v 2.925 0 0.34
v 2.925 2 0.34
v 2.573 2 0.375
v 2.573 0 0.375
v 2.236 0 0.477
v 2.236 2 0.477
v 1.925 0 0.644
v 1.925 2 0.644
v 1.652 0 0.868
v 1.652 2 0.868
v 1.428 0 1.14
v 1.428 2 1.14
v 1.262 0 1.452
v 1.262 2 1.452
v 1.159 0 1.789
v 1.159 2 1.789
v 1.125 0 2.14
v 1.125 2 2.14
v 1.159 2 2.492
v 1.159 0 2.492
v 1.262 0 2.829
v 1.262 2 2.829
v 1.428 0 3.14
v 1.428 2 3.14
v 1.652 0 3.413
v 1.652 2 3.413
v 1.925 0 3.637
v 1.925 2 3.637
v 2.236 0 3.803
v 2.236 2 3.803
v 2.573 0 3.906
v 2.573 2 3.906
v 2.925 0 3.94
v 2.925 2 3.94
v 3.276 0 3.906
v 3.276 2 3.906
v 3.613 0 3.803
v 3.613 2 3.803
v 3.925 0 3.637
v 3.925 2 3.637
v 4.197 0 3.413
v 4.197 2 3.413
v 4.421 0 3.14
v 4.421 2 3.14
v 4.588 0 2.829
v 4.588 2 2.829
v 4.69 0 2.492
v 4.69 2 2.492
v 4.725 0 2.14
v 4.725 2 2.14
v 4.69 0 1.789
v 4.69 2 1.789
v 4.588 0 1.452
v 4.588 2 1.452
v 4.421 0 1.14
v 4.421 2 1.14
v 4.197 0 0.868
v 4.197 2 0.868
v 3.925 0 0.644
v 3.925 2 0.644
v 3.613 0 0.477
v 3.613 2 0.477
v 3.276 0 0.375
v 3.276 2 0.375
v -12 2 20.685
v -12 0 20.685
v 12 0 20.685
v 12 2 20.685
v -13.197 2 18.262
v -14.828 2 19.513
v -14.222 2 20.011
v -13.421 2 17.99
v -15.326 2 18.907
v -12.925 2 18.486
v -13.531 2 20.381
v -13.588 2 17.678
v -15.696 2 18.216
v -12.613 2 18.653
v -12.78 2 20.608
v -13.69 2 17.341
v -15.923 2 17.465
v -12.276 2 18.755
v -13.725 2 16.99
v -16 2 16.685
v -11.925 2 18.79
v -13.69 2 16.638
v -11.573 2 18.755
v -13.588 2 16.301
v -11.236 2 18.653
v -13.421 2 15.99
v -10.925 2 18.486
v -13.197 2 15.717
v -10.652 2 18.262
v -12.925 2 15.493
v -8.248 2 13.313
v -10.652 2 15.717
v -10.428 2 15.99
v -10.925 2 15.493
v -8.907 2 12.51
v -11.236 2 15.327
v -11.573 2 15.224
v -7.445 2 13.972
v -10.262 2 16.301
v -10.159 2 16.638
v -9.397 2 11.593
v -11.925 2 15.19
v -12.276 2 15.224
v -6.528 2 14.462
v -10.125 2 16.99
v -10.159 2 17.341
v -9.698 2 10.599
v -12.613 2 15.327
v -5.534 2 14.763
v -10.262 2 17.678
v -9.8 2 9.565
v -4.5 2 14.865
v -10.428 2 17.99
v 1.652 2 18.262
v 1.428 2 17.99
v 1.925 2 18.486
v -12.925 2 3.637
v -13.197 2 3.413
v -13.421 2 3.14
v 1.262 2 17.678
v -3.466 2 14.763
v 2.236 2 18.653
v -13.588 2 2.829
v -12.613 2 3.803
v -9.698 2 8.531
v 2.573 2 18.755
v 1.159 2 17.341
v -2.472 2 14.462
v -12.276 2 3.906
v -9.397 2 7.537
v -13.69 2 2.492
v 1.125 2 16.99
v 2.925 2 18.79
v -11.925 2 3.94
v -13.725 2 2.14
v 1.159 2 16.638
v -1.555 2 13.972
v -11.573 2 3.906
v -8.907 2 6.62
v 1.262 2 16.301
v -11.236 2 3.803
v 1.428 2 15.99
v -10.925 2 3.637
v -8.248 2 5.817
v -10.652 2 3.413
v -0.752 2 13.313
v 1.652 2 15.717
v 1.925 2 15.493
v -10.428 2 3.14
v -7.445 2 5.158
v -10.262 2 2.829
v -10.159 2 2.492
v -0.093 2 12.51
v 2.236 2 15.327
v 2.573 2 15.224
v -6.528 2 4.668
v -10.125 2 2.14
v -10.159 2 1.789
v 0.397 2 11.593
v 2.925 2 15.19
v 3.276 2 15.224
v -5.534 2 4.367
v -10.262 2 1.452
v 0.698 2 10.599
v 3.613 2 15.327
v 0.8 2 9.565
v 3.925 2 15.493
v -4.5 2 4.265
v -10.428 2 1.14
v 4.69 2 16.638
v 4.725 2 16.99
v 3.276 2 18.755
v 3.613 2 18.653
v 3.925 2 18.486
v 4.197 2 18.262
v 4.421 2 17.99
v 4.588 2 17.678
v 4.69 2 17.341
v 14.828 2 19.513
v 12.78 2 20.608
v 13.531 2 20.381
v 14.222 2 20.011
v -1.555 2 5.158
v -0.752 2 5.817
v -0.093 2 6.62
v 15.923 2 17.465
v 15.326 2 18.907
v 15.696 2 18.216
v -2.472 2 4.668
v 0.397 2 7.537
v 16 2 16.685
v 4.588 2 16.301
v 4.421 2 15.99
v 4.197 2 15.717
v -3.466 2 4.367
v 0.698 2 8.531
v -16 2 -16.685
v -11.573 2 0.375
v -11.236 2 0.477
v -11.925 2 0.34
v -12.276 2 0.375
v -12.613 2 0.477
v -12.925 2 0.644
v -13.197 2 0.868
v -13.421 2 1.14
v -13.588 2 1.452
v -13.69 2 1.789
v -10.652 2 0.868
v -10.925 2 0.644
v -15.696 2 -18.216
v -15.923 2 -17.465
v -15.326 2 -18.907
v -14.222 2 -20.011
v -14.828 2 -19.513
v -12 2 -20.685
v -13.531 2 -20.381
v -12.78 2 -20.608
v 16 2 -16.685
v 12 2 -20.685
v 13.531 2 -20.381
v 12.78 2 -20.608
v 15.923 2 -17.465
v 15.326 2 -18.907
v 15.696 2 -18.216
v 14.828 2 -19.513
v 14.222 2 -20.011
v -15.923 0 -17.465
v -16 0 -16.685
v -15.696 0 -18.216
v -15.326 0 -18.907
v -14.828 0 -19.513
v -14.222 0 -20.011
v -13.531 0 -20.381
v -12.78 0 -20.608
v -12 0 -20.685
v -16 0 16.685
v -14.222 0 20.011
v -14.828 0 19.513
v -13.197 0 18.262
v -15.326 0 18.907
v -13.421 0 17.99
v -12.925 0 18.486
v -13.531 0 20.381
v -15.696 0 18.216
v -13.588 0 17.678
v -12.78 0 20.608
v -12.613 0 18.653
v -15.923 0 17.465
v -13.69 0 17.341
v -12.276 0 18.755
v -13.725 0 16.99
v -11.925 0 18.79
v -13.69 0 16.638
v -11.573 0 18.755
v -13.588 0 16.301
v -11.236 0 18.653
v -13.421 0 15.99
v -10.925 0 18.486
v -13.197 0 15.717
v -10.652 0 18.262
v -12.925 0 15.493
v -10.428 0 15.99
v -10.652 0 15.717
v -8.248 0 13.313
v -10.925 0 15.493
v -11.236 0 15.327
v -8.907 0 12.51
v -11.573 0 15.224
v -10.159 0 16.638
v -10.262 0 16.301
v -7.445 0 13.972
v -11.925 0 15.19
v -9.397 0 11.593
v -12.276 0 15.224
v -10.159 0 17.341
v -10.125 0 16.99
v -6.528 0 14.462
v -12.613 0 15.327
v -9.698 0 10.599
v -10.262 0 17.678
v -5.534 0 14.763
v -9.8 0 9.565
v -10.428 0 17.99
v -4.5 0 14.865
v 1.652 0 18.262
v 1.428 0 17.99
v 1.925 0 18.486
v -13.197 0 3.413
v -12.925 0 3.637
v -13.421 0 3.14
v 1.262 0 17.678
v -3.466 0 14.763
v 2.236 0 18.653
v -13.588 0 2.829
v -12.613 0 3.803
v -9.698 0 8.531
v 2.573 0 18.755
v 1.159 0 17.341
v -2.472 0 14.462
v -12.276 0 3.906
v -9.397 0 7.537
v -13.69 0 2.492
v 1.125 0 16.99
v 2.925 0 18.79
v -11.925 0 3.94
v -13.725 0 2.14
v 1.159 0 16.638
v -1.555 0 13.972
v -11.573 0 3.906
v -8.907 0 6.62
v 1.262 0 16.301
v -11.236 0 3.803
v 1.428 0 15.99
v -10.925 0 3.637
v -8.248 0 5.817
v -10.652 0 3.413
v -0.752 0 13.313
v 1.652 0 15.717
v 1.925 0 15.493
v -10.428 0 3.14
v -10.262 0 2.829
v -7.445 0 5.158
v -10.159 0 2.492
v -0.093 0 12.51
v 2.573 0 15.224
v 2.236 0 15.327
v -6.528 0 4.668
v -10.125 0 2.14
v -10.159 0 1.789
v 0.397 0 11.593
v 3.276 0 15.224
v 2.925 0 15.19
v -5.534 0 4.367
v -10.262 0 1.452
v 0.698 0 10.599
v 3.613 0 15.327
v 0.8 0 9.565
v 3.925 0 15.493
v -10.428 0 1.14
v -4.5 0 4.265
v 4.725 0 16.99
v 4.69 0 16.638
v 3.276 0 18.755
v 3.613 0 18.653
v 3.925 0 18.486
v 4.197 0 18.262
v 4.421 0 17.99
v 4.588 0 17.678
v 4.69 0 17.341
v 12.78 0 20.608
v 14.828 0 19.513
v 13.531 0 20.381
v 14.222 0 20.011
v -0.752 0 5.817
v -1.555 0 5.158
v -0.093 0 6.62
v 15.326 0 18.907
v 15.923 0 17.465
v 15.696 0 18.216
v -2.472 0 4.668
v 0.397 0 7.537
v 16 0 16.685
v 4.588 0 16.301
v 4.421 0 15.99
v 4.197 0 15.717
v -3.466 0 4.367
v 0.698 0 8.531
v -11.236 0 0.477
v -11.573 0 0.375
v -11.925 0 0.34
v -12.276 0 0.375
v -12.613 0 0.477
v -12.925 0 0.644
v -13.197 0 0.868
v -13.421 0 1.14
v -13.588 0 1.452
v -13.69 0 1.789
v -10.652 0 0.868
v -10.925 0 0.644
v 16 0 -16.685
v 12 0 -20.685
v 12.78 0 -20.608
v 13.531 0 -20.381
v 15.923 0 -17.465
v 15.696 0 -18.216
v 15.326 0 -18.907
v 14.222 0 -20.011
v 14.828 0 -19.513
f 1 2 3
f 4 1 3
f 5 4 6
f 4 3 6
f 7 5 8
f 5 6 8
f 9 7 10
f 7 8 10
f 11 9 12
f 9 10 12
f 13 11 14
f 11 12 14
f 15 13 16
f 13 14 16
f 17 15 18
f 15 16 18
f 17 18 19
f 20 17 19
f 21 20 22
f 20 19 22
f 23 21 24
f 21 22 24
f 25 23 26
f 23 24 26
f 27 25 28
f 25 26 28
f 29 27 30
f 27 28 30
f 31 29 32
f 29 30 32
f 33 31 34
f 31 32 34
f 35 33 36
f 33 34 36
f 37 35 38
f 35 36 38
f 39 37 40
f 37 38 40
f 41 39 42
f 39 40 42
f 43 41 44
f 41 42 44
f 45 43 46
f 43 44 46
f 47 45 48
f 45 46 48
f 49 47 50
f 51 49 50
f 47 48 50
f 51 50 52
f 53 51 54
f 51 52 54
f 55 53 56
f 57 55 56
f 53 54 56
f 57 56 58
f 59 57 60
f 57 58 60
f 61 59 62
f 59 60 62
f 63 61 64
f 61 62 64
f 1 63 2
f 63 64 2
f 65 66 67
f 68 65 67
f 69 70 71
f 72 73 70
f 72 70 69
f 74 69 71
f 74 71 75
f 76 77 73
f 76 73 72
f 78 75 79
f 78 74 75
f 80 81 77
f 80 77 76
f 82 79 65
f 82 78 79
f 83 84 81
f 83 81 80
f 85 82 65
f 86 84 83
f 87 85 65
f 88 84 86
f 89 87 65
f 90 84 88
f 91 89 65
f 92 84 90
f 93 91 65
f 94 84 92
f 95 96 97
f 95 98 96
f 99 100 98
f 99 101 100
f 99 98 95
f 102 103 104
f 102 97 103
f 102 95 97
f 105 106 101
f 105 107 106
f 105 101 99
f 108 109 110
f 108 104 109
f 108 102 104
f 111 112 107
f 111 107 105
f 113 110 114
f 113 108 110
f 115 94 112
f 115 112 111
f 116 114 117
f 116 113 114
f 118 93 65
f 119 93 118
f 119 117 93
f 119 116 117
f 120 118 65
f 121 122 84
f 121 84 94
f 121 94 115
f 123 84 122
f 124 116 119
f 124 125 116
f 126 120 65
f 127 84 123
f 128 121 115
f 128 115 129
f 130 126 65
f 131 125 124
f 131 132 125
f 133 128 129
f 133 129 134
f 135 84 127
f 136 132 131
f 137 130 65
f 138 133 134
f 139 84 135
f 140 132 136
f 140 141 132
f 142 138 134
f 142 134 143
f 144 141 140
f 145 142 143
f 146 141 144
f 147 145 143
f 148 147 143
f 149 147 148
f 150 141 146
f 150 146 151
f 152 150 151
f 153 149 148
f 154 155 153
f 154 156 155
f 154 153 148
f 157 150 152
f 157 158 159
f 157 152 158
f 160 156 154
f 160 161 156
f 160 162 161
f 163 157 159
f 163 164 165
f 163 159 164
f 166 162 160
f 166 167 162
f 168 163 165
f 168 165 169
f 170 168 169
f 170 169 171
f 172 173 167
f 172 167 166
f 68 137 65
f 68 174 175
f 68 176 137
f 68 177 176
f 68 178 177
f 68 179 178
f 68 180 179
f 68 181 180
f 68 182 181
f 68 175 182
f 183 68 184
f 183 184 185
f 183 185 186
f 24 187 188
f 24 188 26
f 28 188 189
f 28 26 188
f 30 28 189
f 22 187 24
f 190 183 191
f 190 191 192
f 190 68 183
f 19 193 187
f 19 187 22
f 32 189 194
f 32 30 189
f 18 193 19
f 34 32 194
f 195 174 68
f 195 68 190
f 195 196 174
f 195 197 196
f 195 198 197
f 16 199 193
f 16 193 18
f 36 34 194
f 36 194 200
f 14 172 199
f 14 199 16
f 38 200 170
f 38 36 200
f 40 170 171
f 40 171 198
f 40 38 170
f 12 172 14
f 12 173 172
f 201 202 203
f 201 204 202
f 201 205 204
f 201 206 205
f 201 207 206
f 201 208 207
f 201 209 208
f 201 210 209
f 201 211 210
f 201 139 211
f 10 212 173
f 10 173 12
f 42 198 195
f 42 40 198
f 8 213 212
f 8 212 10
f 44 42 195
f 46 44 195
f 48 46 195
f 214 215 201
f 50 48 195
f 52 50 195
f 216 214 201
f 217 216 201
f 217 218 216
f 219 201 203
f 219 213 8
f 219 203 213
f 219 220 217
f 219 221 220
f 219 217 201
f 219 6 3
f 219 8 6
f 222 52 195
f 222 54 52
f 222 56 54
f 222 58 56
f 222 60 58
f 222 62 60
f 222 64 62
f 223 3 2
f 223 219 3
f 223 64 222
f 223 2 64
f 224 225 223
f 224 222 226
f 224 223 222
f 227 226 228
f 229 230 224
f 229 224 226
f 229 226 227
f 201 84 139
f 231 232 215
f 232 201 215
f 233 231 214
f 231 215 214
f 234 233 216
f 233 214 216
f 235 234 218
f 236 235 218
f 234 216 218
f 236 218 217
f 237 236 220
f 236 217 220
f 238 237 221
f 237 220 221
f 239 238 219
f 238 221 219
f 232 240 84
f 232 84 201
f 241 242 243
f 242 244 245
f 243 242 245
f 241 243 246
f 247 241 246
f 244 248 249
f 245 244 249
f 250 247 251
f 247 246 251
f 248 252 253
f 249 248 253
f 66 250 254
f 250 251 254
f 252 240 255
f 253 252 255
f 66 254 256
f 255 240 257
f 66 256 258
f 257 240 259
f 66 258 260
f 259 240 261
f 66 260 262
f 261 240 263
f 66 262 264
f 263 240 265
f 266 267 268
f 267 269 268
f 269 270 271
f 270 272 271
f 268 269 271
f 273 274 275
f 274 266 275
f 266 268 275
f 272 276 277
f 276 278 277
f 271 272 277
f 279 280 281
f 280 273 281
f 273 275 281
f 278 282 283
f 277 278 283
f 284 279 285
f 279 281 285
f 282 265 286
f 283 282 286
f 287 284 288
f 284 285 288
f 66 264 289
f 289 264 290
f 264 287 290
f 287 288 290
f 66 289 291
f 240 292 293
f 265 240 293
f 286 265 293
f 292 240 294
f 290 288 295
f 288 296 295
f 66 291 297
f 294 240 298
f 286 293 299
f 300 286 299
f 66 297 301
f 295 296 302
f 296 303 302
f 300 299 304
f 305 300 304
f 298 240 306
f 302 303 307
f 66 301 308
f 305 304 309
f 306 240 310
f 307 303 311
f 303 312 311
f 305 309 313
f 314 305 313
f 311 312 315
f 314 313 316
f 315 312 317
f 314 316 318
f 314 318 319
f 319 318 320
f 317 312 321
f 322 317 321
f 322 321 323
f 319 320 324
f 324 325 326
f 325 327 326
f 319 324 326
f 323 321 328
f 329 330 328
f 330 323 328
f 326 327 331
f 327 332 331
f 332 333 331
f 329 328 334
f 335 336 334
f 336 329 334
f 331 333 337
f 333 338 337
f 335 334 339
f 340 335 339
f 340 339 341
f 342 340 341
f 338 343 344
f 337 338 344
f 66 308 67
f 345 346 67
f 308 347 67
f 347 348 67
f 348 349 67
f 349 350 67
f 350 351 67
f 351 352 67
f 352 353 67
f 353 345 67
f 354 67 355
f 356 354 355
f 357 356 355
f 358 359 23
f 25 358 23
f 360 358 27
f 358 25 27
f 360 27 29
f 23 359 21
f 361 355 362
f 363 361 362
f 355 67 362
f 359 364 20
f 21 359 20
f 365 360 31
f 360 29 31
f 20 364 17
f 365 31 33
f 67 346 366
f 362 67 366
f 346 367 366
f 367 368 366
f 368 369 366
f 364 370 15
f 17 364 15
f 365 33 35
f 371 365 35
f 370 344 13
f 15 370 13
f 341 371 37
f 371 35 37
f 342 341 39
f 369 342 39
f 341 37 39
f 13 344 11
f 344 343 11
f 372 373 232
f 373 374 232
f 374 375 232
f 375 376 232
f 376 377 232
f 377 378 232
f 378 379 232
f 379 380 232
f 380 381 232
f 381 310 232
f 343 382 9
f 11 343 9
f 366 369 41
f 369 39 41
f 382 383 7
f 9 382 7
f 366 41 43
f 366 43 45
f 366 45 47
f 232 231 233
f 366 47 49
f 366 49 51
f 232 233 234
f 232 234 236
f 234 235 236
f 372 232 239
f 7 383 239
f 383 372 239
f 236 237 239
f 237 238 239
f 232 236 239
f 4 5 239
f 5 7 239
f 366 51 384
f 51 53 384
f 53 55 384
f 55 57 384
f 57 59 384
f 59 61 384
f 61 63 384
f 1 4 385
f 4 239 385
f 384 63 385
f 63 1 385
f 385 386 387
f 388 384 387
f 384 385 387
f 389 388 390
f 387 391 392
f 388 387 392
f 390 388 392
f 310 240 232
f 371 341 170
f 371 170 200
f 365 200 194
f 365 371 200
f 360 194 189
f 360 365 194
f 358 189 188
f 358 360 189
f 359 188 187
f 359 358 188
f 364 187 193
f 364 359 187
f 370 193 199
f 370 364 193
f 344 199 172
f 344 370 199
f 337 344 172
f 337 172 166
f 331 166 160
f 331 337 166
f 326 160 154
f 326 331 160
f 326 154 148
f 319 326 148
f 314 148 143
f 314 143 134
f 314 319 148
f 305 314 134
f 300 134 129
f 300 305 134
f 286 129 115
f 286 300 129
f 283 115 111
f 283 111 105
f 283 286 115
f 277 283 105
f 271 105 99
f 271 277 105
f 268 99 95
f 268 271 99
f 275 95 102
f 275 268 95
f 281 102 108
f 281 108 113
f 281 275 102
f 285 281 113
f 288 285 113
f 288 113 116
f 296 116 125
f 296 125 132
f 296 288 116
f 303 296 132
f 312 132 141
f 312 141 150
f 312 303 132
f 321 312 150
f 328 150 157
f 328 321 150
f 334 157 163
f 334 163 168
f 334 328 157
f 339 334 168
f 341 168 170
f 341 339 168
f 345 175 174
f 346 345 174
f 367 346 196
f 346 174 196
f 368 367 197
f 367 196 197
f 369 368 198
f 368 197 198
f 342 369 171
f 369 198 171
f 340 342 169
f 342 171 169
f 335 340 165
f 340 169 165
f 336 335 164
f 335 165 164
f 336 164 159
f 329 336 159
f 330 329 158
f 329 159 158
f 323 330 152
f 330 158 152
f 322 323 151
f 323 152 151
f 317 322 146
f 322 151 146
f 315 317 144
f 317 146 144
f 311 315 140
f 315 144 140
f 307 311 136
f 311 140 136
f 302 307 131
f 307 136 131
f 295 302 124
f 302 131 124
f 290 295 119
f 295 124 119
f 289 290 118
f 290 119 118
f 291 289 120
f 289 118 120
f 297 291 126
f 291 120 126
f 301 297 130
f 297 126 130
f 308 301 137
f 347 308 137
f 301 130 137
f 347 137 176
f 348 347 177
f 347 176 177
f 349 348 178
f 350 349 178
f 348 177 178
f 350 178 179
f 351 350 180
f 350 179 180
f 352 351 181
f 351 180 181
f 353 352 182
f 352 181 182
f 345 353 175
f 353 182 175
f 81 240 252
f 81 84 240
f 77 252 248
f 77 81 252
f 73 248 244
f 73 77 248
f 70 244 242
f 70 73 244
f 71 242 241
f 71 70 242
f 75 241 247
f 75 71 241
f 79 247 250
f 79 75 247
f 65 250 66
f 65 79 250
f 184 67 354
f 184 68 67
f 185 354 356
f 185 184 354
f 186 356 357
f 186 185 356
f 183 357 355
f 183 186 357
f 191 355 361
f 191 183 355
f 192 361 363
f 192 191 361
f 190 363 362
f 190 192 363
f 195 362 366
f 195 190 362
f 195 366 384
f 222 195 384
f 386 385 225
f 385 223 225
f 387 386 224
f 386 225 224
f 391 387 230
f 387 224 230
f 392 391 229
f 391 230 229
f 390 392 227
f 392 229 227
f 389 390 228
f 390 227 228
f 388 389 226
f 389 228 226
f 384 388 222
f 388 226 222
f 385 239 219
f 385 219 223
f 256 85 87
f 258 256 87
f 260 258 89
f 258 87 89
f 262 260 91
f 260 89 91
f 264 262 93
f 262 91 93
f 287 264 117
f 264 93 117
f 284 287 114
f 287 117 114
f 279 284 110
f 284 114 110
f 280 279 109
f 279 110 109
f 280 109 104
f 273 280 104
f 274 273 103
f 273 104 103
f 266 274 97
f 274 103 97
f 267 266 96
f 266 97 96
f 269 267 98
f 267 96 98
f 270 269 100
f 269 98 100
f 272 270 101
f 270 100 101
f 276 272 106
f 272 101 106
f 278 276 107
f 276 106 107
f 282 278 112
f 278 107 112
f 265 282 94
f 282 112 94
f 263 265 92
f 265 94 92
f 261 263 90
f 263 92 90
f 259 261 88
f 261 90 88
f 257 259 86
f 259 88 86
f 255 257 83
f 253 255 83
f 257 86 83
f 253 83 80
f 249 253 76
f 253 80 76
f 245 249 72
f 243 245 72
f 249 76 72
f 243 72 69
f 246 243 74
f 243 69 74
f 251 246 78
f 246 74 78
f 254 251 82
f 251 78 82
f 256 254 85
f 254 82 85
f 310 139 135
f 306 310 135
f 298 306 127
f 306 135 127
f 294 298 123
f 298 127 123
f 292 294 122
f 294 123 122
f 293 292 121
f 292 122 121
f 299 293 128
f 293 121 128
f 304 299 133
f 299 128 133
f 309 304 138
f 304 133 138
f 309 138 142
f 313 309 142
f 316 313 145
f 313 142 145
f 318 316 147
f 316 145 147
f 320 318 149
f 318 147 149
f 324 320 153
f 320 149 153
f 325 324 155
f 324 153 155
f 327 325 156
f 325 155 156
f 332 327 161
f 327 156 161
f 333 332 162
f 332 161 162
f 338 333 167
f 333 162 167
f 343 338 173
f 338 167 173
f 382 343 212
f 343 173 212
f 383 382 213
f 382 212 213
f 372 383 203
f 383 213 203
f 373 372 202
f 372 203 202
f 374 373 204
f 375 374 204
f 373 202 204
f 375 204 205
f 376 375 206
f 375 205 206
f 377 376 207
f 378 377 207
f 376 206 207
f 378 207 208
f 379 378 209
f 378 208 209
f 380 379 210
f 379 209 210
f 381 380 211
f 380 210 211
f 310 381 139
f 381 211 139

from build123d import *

# Parameters (mm, degrees)
CROQUIS1_W              = 32
CROQUIS1_H              = 41.37
CROQUIS1_R              = 5.3
SALIENTE_EXTRUIR1_DEPTH = 2
CROQUIS2_R              = 1.8
CORTAR_EXTRUIR1_DEPTH   = 2
MATRIZC1_COUNT          = 4
REDONDEO1_R             = 4


with BuildPart() as part:
    # Croquis1 → Saliente-Extruir1 (new body)
    with BuildSketch(Plane(origin=(0, 0, 0), x_dir=(1, 0, 0), z_dir=(0, 1, 0))):
        Rectangle(CROQUIS1_W, CROQUIS1_H)
        with Locations((-4.5, -9.565)):
            Circle(CROQUIS1_R, mode=Mode.SUBTRACT)
    extrude(amount=SALIENTE_EXTRUIR1_DEPTH)

    # Croquis2 → Cortar-Extruir1 (cut)
    with BuildSketch(Plane(origin=(0, 2, 0), x_dir=(1, 0, 0), z_dir=(0, 1, 0))):
        with Locations((2.924621202, -16.989621202)):
            Circle(CROQUIS2_R)
    cortar_extruir1 = extrude(amount=-CORTAR_EXTRUIR1_DEPTH, mode=Mode.SUBTRACT)

    # MatrizC1: Cortar-Extruir1 ×4 about axis
    matrizc1_axis = Axis((-4.5, 0, 9.565), (0, 1, 0))
    for i in range(1, MATRIZC1_COUNT):
        add(cortar_extruir1.rotate(matrizc1_axis, i * 360 / MATRIZC1_COUNT), mode=Mode.SUBTRACT)

    # Redondeo1
    redondeo1_edges = [part.edges().sort_by_distance(p)[0] for p in [
        (16, 1, 20.685),
        (-16, 1, 20.685),
        (-16, 1, -20.685),
        (16, 1, -20.685),
    ]]
    fillet(redondeo1_edges, radius=REDONDEO1_R)


solid = part.part
